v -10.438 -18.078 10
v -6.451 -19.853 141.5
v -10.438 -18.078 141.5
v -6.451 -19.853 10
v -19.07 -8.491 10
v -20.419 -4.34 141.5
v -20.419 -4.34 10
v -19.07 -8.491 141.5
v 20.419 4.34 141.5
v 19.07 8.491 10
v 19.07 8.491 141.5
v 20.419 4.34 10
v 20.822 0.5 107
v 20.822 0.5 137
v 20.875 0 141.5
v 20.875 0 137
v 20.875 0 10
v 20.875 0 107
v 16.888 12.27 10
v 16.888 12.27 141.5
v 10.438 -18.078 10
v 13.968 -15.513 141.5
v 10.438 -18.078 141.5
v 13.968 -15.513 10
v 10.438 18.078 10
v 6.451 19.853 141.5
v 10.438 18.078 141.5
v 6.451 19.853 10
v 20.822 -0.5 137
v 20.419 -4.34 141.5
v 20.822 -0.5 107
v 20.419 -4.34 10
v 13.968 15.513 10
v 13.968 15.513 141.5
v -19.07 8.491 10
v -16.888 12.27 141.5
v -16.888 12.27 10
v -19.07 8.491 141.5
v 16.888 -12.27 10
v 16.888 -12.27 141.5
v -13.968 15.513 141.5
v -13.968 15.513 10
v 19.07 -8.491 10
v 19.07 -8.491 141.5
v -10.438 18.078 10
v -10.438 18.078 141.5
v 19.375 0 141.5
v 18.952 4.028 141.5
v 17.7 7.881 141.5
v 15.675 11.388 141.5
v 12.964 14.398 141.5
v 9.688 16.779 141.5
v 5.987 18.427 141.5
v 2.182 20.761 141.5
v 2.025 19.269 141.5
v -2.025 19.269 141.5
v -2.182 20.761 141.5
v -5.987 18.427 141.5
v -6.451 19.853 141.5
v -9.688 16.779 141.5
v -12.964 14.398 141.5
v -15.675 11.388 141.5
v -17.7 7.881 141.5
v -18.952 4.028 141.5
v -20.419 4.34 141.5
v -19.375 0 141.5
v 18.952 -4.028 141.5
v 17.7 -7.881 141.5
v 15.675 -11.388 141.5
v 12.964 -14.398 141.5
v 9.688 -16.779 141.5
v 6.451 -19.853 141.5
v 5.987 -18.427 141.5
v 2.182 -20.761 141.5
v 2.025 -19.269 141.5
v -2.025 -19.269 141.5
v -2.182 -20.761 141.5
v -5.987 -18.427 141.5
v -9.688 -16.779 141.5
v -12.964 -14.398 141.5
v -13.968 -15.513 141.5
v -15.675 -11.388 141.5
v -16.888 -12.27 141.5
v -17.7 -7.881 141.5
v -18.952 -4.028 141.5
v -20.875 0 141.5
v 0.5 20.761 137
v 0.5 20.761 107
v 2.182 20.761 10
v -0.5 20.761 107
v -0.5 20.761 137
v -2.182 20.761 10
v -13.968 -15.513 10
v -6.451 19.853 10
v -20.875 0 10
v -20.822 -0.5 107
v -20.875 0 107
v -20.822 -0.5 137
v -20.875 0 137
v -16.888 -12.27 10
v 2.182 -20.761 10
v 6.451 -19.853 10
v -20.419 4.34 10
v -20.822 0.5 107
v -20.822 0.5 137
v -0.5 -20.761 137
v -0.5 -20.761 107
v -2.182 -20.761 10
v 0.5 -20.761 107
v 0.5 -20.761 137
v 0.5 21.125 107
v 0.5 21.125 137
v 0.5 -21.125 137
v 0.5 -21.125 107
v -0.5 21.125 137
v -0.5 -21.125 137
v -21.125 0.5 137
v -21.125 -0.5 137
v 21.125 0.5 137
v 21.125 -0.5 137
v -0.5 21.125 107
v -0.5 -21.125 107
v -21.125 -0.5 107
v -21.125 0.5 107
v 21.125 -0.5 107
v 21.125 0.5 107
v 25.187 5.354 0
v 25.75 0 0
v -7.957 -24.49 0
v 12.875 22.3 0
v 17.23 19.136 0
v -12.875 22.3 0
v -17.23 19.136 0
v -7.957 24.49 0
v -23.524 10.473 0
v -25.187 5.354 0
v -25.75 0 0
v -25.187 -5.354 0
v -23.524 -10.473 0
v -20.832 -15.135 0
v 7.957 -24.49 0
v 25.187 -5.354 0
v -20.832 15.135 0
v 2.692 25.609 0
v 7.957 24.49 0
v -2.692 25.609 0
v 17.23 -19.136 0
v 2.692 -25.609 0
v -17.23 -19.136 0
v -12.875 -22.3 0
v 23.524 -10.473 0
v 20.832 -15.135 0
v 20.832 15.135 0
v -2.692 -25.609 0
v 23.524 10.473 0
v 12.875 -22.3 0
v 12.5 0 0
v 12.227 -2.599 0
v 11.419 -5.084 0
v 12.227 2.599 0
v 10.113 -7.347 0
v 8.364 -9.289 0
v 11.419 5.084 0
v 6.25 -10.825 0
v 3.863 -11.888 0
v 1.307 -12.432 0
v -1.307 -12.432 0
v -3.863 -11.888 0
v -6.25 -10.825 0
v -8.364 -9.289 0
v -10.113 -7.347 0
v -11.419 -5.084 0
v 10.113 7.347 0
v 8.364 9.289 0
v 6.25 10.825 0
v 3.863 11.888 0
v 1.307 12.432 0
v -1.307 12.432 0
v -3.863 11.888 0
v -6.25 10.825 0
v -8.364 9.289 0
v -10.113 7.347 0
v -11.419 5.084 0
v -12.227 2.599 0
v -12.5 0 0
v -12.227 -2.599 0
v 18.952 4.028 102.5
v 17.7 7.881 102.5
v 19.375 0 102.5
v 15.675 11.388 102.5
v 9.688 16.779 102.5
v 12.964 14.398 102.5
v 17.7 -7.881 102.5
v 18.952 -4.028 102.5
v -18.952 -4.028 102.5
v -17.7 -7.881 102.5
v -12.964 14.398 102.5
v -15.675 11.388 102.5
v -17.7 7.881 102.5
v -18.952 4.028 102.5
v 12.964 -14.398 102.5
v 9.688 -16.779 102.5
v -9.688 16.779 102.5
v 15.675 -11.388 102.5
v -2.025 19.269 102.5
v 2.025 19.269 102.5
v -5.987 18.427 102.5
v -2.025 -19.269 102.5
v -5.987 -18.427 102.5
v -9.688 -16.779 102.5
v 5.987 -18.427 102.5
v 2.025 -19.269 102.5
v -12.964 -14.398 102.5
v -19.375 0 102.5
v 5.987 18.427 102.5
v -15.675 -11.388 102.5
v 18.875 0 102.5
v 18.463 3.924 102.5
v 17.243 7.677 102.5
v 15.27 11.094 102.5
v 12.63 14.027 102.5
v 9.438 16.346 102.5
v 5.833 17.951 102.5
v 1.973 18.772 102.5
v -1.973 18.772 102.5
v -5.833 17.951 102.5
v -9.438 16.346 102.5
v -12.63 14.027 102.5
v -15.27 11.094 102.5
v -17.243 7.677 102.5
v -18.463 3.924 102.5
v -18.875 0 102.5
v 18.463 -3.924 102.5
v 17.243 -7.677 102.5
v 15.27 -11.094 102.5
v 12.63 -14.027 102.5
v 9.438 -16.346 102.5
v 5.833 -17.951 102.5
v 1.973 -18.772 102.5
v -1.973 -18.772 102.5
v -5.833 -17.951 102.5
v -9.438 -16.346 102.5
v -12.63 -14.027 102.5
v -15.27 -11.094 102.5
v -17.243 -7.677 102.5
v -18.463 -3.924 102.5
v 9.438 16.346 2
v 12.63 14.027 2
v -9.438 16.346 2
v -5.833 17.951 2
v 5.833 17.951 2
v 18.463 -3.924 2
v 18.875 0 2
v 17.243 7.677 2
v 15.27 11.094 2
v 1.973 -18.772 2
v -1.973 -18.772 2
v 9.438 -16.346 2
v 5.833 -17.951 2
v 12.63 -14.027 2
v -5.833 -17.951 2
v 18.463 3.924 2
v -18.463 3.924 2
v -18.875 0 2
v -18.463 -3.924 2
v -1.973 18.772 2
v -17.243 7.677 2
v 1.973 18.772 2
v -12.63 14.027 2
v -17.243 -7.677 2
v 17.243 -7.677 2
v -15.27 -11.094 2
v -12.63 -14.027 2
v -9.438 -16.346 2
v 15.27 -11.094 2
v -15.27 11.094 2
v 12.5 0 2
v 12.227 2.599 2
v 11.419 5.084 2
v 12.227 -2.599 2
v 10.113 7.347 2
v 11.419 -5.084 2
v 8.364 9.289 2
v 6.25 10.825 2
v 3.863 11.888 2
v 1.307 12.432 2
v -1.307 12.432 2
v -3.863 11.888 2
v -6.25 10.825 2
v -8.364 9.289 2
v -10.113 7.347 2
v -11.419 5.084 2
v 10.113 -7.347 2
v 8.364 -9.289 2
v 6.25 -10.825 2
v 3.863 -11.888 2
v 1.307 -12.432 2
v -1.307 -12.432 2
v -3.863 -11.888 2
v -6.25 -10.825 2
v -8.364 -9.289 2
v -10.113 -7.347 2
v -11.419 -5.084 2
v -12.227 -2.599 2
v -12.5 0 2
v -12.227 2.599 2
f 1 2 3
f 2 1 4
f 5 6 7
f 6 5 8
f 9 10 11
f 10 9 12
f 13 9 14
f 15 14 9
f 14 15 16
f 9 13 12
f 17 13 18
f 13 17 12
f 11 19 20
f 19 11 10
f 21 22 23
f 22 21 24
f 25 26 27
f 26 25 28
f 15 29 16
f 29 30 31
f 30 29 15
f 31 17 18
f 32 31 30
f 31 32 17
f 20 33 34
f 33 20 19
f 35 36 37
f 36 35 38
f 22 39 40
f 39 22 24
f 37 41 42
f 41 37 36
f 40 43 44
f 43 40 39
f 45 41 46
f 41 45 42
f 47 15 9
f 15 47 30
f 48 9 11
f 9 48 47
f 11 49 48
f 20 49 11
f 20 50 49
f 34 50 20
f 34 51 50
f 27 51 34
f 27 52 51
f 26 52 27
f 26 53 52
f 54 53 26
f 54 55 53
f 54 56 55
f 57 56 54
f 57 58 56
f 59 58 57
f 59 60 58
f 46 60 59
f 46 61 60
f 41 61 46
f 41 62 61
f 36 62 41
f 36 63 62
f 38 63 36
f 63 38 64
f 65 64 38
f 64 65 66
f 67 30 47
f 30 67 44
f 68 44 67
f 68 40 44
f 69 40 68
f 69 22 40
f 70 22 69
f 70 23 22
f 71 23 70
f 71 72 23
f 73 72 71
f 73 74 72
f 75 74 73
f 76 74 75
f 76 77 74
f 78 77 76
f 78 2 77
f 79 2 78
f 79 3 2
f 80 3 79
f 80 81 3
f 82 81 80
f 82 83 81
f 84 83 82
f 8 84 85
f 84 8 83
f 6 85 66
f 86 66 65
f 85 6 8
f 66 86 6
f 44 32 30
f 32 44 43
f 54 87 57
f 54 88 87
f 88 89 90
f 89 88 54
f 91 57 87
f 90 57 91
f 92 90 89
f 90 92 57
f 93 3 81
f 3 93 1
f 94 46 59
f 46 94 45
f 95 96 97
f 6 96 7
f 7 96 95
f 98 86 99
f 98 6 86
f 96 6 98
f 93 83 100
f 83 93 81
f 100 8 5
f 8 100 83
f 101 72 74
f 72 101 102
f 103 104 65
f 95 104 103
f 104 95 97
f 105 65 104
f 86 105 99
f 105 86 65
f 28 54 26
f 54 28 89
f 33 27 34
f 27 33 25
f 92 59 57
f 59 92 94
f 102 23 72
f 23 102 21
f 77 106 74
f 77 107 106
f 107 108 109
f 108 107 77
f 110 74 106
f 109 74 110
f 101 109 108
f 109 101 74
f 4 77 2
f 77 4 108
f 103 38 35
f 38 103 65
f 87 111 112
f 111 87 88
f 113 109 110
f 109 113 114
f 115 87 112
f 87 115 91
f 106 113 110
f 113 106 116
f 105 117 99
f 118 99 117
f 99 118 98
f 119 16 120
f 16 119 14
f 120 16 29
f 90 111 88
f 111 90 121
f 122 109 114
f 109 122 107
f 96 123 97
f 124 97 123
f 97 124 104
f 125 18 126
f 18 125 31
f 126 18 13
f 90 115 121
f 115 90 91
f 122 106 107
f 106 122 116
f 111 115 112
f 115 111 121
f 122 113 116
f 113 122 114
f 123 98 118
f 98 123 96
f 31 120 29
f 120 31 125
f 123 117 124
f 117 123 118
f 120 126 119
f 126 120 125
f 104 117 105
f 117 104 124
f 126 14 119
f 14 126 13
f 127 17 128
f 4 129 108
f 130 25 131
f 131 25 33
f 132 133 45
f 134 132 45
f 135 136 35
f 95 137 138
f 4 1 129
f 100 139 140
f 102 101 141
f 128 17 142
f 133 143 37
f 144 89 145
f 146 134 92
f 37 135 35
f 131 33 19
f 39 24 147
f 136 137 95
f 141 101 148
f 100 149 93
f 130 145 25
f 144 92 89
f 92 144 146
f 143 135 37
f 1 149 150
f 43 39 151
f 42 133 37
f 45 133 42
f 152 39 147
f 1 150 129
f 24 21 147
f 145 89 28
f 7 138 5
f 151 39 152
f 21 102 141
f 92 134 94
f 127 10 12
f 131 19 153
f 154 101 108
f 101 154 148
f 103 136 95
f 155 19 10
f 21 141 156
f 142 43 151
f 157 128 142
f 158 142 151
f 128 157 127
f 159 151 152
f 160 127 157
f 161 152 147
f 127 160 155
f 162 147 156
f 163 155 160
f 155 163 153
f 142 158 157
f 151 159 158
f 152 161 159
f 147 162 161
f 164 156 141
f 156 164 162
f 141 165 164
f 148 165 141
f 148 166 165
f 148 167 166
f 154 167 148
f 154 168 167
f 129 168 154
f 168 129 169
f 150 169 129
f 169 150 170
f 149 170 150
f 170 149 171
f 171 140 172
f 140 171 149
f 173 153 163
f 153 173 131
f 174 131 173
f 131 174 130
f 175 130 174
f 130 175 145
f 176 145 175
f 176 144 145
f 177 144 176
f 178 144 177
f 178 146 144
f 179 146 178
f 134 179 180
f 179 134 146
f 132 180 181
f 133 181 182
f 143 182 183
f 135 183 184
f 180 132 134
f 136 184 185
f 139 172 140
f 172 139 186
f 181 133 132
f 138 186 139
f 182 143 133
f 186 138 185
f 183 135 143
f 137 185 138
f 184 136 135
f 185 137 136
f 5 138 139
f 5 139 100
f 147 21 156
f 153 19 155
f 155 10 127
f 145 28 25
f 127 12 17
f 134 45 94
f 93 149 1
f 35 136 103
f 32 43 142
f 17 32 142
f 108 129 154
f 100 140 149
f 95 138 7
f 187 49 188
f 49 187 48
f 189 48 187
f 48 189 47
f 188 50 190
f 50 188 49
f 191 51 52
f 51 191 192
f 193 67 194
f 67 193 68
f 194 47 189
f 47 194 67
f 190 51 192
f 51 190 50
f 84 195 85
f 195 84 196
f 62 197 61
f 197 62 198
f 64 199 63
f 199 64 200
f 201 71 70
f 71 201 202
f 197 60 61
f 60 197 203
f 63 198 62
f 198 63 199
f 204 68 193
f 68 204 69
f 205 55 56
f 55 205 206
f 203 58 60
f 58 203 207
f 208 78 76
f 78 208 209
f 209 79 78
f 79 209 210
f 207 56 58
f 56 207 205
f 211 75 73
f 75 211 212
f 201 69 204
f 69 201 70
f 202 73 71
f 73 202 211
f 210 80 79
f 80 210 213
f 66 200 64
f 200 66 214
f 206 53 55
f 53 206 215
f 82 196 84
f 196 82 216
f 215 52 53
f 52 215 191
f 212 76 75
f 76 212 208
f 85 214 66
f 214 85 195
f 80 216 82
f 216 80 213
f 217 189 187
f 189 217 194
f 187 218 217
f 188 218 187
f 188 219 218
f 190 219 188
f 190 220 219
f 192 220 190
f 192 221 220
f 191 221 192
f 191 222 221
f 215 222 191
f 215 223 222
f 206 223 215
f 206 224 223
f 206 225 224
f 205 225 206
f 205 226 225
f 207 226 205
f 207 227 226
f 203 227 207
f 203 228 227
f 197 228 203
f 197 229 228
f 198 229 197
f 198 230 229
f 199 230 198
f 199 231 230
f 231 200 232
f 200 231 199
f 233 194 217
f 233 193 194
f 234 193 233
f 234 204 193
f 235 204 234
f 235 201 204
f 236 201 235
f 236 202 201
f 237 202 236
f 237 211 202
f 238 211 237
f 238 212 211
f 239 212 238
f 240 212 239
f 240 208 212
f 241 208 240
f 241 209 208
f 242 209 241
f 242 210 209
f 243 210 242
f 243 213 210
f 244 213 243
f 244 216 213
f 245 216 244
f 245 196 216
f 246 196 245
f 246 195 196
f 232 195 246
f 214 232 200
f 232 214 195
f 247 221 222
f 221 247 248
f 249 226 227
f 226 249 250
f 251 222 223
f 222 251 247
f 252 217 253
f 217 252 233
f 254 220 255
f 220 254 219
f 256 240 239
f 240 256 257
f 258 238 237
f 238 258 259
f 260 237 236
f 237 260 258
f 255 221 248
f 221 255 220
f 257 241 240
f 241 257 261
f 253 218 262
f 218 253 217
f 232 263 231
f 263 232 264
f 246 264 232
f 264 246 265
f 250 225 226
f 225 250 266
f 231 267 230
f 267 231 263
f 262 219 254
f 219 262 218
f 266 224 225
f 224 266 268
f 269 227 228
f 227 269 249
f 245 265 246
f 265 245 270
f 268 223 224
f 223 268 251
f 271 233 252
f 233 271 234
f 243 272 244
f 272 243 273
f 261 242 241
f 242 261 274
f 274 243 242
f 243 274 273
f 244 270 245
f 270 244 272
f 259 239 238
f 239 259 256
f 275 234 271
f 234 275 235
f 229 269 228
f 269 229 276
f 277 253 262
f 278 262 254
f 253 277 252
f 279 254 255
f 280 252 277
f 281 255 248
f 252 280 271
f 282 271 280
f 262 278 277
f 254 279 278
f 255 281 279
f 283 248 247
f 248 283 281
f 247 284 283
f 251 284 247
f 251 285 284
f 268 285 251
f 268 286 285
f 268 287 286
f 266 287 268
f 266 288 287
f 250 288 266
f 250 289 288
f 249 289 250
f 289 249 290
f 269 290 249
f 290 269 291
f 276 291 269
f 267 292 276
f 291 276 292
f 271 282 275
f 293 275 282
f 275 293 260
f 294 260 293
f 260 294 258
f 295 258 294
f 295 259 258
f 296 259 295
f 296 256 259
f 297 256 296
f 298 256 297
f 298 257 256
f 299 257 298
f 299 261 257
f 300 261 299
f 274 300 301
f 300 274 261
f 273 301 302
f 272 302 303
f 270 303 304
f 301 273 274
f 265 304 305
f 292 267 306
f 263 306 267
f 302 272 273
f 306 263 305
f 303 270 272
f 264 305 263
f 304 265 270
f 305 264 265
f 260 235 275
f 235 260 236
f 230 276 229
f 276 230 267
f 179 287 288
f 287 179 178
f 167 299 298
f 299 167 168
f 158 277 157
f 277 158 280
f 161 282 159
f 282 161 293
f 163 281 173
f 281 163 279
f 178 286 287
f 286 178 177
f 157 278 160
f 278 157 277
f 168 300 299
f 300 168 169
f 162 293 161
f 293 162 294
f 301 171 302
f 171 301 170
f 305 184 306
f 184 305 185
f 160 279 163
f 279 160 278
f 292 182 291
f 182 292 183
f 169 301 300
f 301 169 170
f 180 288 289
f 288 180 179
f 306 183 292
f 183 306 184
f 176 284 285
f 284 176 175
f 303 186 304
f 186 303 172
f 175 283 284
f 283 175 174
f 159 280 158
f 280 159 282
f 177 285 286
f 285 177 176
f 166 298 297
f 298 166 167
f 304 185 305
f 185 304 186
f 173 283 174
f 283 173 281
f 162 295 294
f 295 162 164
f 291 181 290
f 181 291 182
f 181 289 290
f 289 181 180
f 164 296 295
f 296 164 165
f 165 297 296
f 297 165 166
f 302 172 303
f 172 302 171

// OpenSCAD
/* [Tube Foot] */

// original 66.5, new 141.5
total_height_text_box = 141.5;

// Thickness of the main tube body
shell_width = 2;

// Tube thickness to accept the tube above it, the rest of the tube can be thicker
top_shell_width = 1.5;

// Diameter of the outside of the tube
outer_diameter_textbox = 41.75;

// Foot diameter, make it bigger to spread the weight.
foot_diameter_text_box = 51.5;

// Hight of the foot relief 
foot_relief_height_text_box = 10;

// Hole diameter at bottom of foot
foot_hole_diameter_text_box = 25;

// Vertical line length
friction_line_height_text_box = 30;

// Width of vertical friction line
friction_line_width_text_box = 1;

// Depth of vertical friction line, increase for more friction
friction_line_depth_text_box = 0.25;

// offset of vertical friction line
friction_line_top_offset_text_box = 4.5;

main_height_text_box = total_height_text_box - foot_relief_height_text_box;

top_innertube_height = friction_line_height_text_box + 2*friction_line_top_offset_text_box;


module build_tube(){
    difference(){
        union(){
        
            // Full tube
            translate([0, 0, foot_relief_height_text_box]) cylinder(main_height_text_box, r=outer_diameter_textbox/2, center=false);

            // Fiction line
            translate([0, 0, foot_relief_height_text_box + main_height_text_box - friction_line_top_offset_text_box - friction_line_height_text_box/2]) cube([friction_line_width_text_box, outer_diameter_textbox + 2*friction_line_depth_text_box, friction_line_height_text_box], center=true);
            
            // Fiction line
            rotate([0,0,90]) translate([0, 0, foot_relief_height_text_box + main_height_text_box - friction_line_top_offset_text_box - friction_line_height_text_box/2]) cube([friction_line_width_text_box, outer_diameter_textbox + 2*friction_line_depth_text_box, friction_line_height_text_box], center=true);
            
            // Main foot
            cylinder(foot_relief_height_text_box, r1=foot_diameter_text_box/2, r2=outer_diameter_textbox/2, center=false);
            
        }
            
        
        // Make top part of tube correct shell width to fit with original parts
        translate([0, 0, foot_relief_height_text_box + main_height_text_box - top_innertube_height]) cylinder(top_innertube_height, r=(outer_diameter_textbox - 2*top_shell_width)/2, center=false);
            
        // Hollow part of tube
        translate([0, 0, shell_width]) cylinder(main_height_text_box + foot_relief_height_text_box, r= (outer_diameter_textbox - 2*shell_width)/2, center=false);
        
        // Bottom foot hole
        cylinder(foot_relief_height_text_box * 3, r=foot_hole_diameter_text_box/2, center=true);

    }
}

build_tube();
    
    
